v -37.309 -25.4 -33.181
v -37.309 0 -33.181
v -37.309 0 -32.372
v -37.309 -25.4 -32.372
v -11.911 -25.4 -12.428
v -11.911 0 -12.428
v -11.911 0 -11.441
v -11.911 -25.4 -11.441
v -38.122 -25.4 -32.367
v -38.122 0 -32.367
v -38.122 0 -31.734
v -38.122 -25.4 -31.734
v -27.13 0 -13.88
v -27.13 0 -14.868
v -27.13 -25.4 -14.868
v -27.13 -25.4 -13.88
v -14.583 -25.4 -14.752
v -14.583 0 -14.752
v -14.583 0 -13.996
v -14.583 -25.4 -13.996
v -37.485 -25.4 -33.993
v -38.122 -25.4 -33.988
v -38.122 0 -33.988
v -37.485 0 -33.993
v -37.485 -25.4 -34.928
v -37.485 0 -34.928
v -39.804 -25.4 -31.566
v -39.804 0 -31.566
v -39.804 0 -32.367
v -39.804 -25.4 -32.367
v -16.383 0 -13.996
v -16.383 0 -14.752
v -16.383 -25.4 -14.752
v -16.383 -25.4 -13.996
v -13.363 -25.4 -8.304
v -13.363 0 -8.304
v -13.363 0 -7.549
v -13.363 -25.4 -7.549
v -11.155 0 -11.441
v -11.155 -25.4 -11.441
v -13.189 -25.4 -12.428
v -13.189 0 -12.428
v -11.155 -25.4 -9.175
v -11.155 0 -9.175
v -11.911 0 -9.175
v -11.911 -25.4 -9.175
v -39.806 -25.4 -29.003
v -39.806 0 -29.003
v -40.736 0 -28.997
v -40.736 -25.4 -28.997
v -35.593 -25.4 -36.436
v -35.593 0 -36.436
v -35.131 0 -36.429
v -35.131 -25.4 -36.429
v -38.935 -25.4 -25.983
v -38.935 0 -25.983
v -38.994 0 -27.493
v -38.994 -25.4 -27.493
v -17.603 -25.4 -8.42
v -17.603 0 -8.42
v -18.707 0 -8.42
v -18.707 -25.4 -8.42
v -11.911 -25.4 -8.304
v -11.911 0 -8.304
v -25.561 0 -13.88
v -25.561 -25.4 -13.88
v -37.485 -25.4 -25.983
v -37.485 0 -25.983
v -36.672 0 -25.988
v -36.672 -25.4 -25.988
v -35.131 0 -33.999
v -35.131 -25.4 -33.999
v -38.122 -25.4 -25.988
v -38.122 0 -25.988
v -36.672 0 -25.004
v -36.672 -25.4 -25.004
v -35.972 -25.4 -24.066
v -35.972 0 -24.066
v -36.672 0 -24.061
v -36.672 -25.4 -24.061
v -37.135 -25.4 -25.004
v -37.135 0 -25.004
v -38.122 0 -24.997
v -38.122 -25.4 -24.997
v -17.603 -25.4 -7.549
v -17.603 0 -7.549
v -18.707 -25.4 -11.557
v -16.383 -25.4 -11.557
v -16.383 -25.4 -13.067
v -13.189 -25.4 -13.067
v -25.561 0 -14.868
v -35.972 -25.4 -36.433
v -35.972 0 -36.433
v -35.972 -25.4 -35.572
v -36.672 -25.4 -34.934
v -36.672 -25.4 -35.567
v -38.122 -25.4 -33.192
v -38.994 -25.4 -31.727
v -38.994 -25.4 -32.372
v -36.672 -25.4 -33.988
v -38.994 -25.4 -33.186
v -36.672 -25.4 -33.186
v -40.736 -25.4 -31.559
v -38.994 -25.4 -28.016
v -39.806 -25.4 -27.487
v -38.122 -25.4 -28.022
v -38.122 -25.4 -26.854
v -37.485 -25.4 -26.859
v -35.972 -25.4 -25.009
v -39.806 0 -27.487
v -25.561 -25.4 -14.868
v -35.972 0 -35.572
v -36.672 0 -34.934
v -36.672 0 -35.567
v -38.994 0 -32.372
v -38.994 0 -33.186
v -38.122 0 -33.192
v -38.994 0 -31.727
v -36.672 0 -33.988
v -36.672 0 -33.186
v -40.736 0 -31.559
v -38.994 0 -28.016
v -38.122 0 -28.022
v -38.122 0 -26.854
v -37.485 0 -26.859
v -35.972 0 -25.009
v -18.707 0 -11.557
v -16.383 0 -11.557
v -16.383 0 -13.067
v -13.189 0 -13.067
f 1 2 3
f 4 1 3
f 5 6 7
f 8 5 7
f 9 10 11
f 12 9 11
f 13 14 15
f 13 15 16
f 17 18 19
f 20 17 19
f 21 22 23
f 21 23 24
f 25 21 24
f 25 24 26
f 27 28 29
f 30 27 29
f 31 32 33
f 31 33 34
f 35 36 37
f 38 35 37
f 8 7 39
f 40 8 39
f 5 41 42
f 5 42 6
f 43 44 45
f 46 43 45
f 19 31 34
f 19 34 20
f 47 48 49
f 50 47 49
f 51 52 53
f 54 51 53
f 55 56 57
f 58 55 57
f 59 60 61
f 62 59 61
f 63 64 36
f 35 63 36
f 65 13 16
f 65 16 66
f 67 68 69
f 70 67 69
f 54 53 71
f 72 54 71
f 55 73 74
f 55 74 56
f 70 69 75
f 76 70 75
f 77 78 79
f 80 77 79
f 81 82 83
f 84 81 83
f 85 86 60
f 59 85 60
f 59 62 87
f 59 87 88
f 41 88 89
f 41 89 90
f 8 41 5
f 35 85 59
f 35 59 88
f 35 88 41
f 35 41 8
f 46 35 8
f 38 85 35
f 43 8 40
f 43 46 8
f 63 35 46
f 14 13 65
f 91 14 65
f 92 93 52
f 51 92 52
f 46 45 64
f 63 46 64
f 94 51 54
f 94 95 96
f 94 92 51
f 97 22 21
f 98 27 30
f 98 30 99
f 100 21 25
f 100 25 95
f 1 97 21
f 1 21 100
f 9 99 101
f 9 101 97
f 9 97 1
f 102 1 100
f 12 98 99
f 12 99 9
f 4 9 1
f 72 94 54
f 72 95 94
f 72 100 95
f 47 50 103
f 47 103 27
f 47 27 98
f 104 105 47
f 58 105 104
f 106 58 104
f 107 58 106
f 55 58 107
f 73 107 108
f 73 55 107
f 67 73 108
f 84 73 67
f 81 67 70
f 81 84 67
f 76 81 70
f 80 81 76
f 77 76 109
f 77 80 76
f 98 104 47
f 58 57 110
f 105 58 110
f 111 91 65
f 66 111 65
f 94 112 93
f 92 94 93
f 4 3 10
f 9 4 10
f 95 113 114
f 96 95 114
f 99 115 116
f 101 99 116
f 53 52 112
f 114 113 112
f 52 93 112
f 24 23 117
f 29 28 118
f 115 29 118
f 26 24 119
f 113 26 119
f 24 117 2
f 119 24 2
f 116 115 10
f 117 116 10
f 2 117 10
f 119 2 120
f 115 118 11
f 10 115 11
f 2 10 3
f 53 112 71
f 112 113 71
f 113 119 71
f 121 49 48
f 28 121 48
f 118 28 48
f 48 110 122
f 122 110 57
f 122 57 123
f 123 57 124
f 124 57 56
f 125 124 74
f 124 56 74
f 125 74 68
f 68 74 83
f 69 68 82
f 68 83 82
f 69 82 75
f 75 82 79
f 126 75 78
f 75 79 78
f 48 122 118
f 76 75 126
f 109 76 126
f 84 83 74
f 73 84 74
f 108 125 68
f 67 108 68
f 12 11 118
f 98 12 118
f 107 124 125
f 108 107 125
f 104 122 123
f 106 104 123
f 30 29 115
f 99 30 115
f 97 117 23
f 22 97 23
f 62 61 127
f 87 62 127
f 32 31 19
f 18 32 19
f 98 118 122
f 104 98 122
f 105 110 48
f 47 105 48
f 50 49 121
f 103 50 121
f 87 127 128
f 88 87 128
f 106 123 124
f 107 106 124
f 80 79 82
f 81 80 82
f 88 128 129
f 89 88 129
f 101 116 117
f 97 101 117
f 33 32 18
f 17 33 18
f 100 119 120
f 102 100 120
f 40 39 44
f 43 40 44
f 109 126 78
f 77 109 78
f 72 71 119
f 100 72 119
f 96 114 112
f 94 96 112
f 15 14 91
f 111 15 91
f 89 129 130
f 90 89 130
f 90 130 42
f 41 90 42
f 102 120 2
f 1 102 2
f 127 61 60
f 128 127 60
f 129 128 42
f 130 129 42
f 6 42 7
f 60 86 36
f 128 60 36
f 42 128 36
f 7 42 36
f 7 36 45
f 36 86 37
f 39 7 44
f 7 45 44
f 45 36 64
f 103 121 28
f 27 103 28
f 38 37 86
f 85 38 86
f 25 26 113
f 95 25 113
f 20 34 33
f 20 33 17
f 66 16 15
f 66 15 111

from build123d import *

# Parameters (mm, degrees)
F0_W     = 1.568383
F0_H     = 0.987499
F0_W_2   = 1.800734
F0_H_2   = 0.755146
F1_DEPTH = 25.4


with BuildPart() as f1:
    # F0 (on Front) → F1 (new body)
    with BuildSketch(Plane.XZ):
        with Locations((-26.345548, -14.373976)):
            Rectangle(F0_W, F0_H)
        Polygon((-13.362837, -8.303759), (-13.362837, -7.548613), (-17.603274, -7.548613), (-17.603274, -8.419936), (-18.706951, -8.419936), (-18.706951, -11.556698), (-17.603274, -11.556698), (-17.603274, -10.627287), (-18.126069, -10.627287), (-18.126069, -10.046406), (-17.196657, -10.046406), (-17.196657, -9.291259), (-16.383423, -9.291259), (-16.383423, -8.303759), (-14.117983, -8.303759), (-14.117983, -9.291259), (-13.188573, -9.291259), (-13.188573, -10.046406), (-12.549602, -10.046406), (-12.549602, -10.743463), (-13.188573, -10.743463), (-13.188573, -11.614786), (-14.059896, -11.614786), (-14.059896, -12.398977), (-16.383423, -12.398977), (-16.383423, -13.066991), (-13.188573, -13.066991), (-13.188573, -12.428021), (-11.910632, -12.428021), (-11.910632, -11.440522), (-11.155485, -11.440522), (-11.155485, -9.697876), (-11.155485, -9.175083), (-11.910632, -9.175083), (-11.910632, -8.303759), align=None)
        with Locations((-15.483056, -14.373976)):
            Rectangle(F0_W_2, F0_H_2)
        Polygon((-17.603274, -10.627287), (-17.603274, -11.556698), (-17.196657, -11.556698), (-16.383423, -11.556698), (-16.383423, -12.398977), (-14.059896, -12.398977), (-14.059896, -11.614786), (-13.188573, -11.614786), (-13.188573, -10.743463), (-12.549602, -10.743463), (-12.549602, -10.046406), (-13.188573, -10.046406), (-13.188573, -9.291259), (-14.117983, -9.291259), (-14.117983, -8.303759), (-16.383423, -8.303759), (-16.383423, -9.291259), (-17.196657, -9.291259), (-17.196657, -10.046406), (-18.126069, -10.046406), (-18.126069, -10.627287), align=None)
        Polygon((-35.593046, -36.436006), (-35.130892, -36.429105), (-35.130892, -33.998948), (-36.671974, -33.988171), (-36.671974, -33.185713), (-37.308956, -33.181259), (-37.308956, -32.372478), (-38.122182, -32.366792), (-38.122182, -31.733509), (-38.994315, -31.72741), (-38.994315, -28.520677), (-38.994315, -28.015865), (-38.122182, -28.021964), (-38.122182, -26.854102), (-38.122182, -25.988463), (-38.935117, -25.982779), (-38.994315, -27.493071), (-39.805927, -27.487395), (-39.805927, -29.003365), (-40.735739, -28.996863), (-40.735739, -31.559244), (-39.804388, -31.565757), (-39.804388, -32.366792), (-38.994315, -32.372456), (-38.994315, -33.185713), (-38.122182, -33.191812), (-38.122182, -33.988171), (-37.484909, -33.992627), (-37.484909, -34.928359), (-36.671974, -34.934044), (-36.671974, -35.567332), (-35.971835, -35.572228), (-35.971835, -36.433357), align=None)
        Polygon((-38.122182, -25.988463), (-38.122182, -26.854102), (-37.484909, -26.858558), (-37.484909, -25.982779), (-36.671974, -25.988463), (-36.671974, -25.003754), (-35.971835, -25.00865), (-35.971835, -24.065867), (-36.671974, -24.060971), (-37.134722, -25.003754), (-38.122182, -24.996848), align=None)
    extrude(amount=F1_DEPTH)


solid = f1.part
